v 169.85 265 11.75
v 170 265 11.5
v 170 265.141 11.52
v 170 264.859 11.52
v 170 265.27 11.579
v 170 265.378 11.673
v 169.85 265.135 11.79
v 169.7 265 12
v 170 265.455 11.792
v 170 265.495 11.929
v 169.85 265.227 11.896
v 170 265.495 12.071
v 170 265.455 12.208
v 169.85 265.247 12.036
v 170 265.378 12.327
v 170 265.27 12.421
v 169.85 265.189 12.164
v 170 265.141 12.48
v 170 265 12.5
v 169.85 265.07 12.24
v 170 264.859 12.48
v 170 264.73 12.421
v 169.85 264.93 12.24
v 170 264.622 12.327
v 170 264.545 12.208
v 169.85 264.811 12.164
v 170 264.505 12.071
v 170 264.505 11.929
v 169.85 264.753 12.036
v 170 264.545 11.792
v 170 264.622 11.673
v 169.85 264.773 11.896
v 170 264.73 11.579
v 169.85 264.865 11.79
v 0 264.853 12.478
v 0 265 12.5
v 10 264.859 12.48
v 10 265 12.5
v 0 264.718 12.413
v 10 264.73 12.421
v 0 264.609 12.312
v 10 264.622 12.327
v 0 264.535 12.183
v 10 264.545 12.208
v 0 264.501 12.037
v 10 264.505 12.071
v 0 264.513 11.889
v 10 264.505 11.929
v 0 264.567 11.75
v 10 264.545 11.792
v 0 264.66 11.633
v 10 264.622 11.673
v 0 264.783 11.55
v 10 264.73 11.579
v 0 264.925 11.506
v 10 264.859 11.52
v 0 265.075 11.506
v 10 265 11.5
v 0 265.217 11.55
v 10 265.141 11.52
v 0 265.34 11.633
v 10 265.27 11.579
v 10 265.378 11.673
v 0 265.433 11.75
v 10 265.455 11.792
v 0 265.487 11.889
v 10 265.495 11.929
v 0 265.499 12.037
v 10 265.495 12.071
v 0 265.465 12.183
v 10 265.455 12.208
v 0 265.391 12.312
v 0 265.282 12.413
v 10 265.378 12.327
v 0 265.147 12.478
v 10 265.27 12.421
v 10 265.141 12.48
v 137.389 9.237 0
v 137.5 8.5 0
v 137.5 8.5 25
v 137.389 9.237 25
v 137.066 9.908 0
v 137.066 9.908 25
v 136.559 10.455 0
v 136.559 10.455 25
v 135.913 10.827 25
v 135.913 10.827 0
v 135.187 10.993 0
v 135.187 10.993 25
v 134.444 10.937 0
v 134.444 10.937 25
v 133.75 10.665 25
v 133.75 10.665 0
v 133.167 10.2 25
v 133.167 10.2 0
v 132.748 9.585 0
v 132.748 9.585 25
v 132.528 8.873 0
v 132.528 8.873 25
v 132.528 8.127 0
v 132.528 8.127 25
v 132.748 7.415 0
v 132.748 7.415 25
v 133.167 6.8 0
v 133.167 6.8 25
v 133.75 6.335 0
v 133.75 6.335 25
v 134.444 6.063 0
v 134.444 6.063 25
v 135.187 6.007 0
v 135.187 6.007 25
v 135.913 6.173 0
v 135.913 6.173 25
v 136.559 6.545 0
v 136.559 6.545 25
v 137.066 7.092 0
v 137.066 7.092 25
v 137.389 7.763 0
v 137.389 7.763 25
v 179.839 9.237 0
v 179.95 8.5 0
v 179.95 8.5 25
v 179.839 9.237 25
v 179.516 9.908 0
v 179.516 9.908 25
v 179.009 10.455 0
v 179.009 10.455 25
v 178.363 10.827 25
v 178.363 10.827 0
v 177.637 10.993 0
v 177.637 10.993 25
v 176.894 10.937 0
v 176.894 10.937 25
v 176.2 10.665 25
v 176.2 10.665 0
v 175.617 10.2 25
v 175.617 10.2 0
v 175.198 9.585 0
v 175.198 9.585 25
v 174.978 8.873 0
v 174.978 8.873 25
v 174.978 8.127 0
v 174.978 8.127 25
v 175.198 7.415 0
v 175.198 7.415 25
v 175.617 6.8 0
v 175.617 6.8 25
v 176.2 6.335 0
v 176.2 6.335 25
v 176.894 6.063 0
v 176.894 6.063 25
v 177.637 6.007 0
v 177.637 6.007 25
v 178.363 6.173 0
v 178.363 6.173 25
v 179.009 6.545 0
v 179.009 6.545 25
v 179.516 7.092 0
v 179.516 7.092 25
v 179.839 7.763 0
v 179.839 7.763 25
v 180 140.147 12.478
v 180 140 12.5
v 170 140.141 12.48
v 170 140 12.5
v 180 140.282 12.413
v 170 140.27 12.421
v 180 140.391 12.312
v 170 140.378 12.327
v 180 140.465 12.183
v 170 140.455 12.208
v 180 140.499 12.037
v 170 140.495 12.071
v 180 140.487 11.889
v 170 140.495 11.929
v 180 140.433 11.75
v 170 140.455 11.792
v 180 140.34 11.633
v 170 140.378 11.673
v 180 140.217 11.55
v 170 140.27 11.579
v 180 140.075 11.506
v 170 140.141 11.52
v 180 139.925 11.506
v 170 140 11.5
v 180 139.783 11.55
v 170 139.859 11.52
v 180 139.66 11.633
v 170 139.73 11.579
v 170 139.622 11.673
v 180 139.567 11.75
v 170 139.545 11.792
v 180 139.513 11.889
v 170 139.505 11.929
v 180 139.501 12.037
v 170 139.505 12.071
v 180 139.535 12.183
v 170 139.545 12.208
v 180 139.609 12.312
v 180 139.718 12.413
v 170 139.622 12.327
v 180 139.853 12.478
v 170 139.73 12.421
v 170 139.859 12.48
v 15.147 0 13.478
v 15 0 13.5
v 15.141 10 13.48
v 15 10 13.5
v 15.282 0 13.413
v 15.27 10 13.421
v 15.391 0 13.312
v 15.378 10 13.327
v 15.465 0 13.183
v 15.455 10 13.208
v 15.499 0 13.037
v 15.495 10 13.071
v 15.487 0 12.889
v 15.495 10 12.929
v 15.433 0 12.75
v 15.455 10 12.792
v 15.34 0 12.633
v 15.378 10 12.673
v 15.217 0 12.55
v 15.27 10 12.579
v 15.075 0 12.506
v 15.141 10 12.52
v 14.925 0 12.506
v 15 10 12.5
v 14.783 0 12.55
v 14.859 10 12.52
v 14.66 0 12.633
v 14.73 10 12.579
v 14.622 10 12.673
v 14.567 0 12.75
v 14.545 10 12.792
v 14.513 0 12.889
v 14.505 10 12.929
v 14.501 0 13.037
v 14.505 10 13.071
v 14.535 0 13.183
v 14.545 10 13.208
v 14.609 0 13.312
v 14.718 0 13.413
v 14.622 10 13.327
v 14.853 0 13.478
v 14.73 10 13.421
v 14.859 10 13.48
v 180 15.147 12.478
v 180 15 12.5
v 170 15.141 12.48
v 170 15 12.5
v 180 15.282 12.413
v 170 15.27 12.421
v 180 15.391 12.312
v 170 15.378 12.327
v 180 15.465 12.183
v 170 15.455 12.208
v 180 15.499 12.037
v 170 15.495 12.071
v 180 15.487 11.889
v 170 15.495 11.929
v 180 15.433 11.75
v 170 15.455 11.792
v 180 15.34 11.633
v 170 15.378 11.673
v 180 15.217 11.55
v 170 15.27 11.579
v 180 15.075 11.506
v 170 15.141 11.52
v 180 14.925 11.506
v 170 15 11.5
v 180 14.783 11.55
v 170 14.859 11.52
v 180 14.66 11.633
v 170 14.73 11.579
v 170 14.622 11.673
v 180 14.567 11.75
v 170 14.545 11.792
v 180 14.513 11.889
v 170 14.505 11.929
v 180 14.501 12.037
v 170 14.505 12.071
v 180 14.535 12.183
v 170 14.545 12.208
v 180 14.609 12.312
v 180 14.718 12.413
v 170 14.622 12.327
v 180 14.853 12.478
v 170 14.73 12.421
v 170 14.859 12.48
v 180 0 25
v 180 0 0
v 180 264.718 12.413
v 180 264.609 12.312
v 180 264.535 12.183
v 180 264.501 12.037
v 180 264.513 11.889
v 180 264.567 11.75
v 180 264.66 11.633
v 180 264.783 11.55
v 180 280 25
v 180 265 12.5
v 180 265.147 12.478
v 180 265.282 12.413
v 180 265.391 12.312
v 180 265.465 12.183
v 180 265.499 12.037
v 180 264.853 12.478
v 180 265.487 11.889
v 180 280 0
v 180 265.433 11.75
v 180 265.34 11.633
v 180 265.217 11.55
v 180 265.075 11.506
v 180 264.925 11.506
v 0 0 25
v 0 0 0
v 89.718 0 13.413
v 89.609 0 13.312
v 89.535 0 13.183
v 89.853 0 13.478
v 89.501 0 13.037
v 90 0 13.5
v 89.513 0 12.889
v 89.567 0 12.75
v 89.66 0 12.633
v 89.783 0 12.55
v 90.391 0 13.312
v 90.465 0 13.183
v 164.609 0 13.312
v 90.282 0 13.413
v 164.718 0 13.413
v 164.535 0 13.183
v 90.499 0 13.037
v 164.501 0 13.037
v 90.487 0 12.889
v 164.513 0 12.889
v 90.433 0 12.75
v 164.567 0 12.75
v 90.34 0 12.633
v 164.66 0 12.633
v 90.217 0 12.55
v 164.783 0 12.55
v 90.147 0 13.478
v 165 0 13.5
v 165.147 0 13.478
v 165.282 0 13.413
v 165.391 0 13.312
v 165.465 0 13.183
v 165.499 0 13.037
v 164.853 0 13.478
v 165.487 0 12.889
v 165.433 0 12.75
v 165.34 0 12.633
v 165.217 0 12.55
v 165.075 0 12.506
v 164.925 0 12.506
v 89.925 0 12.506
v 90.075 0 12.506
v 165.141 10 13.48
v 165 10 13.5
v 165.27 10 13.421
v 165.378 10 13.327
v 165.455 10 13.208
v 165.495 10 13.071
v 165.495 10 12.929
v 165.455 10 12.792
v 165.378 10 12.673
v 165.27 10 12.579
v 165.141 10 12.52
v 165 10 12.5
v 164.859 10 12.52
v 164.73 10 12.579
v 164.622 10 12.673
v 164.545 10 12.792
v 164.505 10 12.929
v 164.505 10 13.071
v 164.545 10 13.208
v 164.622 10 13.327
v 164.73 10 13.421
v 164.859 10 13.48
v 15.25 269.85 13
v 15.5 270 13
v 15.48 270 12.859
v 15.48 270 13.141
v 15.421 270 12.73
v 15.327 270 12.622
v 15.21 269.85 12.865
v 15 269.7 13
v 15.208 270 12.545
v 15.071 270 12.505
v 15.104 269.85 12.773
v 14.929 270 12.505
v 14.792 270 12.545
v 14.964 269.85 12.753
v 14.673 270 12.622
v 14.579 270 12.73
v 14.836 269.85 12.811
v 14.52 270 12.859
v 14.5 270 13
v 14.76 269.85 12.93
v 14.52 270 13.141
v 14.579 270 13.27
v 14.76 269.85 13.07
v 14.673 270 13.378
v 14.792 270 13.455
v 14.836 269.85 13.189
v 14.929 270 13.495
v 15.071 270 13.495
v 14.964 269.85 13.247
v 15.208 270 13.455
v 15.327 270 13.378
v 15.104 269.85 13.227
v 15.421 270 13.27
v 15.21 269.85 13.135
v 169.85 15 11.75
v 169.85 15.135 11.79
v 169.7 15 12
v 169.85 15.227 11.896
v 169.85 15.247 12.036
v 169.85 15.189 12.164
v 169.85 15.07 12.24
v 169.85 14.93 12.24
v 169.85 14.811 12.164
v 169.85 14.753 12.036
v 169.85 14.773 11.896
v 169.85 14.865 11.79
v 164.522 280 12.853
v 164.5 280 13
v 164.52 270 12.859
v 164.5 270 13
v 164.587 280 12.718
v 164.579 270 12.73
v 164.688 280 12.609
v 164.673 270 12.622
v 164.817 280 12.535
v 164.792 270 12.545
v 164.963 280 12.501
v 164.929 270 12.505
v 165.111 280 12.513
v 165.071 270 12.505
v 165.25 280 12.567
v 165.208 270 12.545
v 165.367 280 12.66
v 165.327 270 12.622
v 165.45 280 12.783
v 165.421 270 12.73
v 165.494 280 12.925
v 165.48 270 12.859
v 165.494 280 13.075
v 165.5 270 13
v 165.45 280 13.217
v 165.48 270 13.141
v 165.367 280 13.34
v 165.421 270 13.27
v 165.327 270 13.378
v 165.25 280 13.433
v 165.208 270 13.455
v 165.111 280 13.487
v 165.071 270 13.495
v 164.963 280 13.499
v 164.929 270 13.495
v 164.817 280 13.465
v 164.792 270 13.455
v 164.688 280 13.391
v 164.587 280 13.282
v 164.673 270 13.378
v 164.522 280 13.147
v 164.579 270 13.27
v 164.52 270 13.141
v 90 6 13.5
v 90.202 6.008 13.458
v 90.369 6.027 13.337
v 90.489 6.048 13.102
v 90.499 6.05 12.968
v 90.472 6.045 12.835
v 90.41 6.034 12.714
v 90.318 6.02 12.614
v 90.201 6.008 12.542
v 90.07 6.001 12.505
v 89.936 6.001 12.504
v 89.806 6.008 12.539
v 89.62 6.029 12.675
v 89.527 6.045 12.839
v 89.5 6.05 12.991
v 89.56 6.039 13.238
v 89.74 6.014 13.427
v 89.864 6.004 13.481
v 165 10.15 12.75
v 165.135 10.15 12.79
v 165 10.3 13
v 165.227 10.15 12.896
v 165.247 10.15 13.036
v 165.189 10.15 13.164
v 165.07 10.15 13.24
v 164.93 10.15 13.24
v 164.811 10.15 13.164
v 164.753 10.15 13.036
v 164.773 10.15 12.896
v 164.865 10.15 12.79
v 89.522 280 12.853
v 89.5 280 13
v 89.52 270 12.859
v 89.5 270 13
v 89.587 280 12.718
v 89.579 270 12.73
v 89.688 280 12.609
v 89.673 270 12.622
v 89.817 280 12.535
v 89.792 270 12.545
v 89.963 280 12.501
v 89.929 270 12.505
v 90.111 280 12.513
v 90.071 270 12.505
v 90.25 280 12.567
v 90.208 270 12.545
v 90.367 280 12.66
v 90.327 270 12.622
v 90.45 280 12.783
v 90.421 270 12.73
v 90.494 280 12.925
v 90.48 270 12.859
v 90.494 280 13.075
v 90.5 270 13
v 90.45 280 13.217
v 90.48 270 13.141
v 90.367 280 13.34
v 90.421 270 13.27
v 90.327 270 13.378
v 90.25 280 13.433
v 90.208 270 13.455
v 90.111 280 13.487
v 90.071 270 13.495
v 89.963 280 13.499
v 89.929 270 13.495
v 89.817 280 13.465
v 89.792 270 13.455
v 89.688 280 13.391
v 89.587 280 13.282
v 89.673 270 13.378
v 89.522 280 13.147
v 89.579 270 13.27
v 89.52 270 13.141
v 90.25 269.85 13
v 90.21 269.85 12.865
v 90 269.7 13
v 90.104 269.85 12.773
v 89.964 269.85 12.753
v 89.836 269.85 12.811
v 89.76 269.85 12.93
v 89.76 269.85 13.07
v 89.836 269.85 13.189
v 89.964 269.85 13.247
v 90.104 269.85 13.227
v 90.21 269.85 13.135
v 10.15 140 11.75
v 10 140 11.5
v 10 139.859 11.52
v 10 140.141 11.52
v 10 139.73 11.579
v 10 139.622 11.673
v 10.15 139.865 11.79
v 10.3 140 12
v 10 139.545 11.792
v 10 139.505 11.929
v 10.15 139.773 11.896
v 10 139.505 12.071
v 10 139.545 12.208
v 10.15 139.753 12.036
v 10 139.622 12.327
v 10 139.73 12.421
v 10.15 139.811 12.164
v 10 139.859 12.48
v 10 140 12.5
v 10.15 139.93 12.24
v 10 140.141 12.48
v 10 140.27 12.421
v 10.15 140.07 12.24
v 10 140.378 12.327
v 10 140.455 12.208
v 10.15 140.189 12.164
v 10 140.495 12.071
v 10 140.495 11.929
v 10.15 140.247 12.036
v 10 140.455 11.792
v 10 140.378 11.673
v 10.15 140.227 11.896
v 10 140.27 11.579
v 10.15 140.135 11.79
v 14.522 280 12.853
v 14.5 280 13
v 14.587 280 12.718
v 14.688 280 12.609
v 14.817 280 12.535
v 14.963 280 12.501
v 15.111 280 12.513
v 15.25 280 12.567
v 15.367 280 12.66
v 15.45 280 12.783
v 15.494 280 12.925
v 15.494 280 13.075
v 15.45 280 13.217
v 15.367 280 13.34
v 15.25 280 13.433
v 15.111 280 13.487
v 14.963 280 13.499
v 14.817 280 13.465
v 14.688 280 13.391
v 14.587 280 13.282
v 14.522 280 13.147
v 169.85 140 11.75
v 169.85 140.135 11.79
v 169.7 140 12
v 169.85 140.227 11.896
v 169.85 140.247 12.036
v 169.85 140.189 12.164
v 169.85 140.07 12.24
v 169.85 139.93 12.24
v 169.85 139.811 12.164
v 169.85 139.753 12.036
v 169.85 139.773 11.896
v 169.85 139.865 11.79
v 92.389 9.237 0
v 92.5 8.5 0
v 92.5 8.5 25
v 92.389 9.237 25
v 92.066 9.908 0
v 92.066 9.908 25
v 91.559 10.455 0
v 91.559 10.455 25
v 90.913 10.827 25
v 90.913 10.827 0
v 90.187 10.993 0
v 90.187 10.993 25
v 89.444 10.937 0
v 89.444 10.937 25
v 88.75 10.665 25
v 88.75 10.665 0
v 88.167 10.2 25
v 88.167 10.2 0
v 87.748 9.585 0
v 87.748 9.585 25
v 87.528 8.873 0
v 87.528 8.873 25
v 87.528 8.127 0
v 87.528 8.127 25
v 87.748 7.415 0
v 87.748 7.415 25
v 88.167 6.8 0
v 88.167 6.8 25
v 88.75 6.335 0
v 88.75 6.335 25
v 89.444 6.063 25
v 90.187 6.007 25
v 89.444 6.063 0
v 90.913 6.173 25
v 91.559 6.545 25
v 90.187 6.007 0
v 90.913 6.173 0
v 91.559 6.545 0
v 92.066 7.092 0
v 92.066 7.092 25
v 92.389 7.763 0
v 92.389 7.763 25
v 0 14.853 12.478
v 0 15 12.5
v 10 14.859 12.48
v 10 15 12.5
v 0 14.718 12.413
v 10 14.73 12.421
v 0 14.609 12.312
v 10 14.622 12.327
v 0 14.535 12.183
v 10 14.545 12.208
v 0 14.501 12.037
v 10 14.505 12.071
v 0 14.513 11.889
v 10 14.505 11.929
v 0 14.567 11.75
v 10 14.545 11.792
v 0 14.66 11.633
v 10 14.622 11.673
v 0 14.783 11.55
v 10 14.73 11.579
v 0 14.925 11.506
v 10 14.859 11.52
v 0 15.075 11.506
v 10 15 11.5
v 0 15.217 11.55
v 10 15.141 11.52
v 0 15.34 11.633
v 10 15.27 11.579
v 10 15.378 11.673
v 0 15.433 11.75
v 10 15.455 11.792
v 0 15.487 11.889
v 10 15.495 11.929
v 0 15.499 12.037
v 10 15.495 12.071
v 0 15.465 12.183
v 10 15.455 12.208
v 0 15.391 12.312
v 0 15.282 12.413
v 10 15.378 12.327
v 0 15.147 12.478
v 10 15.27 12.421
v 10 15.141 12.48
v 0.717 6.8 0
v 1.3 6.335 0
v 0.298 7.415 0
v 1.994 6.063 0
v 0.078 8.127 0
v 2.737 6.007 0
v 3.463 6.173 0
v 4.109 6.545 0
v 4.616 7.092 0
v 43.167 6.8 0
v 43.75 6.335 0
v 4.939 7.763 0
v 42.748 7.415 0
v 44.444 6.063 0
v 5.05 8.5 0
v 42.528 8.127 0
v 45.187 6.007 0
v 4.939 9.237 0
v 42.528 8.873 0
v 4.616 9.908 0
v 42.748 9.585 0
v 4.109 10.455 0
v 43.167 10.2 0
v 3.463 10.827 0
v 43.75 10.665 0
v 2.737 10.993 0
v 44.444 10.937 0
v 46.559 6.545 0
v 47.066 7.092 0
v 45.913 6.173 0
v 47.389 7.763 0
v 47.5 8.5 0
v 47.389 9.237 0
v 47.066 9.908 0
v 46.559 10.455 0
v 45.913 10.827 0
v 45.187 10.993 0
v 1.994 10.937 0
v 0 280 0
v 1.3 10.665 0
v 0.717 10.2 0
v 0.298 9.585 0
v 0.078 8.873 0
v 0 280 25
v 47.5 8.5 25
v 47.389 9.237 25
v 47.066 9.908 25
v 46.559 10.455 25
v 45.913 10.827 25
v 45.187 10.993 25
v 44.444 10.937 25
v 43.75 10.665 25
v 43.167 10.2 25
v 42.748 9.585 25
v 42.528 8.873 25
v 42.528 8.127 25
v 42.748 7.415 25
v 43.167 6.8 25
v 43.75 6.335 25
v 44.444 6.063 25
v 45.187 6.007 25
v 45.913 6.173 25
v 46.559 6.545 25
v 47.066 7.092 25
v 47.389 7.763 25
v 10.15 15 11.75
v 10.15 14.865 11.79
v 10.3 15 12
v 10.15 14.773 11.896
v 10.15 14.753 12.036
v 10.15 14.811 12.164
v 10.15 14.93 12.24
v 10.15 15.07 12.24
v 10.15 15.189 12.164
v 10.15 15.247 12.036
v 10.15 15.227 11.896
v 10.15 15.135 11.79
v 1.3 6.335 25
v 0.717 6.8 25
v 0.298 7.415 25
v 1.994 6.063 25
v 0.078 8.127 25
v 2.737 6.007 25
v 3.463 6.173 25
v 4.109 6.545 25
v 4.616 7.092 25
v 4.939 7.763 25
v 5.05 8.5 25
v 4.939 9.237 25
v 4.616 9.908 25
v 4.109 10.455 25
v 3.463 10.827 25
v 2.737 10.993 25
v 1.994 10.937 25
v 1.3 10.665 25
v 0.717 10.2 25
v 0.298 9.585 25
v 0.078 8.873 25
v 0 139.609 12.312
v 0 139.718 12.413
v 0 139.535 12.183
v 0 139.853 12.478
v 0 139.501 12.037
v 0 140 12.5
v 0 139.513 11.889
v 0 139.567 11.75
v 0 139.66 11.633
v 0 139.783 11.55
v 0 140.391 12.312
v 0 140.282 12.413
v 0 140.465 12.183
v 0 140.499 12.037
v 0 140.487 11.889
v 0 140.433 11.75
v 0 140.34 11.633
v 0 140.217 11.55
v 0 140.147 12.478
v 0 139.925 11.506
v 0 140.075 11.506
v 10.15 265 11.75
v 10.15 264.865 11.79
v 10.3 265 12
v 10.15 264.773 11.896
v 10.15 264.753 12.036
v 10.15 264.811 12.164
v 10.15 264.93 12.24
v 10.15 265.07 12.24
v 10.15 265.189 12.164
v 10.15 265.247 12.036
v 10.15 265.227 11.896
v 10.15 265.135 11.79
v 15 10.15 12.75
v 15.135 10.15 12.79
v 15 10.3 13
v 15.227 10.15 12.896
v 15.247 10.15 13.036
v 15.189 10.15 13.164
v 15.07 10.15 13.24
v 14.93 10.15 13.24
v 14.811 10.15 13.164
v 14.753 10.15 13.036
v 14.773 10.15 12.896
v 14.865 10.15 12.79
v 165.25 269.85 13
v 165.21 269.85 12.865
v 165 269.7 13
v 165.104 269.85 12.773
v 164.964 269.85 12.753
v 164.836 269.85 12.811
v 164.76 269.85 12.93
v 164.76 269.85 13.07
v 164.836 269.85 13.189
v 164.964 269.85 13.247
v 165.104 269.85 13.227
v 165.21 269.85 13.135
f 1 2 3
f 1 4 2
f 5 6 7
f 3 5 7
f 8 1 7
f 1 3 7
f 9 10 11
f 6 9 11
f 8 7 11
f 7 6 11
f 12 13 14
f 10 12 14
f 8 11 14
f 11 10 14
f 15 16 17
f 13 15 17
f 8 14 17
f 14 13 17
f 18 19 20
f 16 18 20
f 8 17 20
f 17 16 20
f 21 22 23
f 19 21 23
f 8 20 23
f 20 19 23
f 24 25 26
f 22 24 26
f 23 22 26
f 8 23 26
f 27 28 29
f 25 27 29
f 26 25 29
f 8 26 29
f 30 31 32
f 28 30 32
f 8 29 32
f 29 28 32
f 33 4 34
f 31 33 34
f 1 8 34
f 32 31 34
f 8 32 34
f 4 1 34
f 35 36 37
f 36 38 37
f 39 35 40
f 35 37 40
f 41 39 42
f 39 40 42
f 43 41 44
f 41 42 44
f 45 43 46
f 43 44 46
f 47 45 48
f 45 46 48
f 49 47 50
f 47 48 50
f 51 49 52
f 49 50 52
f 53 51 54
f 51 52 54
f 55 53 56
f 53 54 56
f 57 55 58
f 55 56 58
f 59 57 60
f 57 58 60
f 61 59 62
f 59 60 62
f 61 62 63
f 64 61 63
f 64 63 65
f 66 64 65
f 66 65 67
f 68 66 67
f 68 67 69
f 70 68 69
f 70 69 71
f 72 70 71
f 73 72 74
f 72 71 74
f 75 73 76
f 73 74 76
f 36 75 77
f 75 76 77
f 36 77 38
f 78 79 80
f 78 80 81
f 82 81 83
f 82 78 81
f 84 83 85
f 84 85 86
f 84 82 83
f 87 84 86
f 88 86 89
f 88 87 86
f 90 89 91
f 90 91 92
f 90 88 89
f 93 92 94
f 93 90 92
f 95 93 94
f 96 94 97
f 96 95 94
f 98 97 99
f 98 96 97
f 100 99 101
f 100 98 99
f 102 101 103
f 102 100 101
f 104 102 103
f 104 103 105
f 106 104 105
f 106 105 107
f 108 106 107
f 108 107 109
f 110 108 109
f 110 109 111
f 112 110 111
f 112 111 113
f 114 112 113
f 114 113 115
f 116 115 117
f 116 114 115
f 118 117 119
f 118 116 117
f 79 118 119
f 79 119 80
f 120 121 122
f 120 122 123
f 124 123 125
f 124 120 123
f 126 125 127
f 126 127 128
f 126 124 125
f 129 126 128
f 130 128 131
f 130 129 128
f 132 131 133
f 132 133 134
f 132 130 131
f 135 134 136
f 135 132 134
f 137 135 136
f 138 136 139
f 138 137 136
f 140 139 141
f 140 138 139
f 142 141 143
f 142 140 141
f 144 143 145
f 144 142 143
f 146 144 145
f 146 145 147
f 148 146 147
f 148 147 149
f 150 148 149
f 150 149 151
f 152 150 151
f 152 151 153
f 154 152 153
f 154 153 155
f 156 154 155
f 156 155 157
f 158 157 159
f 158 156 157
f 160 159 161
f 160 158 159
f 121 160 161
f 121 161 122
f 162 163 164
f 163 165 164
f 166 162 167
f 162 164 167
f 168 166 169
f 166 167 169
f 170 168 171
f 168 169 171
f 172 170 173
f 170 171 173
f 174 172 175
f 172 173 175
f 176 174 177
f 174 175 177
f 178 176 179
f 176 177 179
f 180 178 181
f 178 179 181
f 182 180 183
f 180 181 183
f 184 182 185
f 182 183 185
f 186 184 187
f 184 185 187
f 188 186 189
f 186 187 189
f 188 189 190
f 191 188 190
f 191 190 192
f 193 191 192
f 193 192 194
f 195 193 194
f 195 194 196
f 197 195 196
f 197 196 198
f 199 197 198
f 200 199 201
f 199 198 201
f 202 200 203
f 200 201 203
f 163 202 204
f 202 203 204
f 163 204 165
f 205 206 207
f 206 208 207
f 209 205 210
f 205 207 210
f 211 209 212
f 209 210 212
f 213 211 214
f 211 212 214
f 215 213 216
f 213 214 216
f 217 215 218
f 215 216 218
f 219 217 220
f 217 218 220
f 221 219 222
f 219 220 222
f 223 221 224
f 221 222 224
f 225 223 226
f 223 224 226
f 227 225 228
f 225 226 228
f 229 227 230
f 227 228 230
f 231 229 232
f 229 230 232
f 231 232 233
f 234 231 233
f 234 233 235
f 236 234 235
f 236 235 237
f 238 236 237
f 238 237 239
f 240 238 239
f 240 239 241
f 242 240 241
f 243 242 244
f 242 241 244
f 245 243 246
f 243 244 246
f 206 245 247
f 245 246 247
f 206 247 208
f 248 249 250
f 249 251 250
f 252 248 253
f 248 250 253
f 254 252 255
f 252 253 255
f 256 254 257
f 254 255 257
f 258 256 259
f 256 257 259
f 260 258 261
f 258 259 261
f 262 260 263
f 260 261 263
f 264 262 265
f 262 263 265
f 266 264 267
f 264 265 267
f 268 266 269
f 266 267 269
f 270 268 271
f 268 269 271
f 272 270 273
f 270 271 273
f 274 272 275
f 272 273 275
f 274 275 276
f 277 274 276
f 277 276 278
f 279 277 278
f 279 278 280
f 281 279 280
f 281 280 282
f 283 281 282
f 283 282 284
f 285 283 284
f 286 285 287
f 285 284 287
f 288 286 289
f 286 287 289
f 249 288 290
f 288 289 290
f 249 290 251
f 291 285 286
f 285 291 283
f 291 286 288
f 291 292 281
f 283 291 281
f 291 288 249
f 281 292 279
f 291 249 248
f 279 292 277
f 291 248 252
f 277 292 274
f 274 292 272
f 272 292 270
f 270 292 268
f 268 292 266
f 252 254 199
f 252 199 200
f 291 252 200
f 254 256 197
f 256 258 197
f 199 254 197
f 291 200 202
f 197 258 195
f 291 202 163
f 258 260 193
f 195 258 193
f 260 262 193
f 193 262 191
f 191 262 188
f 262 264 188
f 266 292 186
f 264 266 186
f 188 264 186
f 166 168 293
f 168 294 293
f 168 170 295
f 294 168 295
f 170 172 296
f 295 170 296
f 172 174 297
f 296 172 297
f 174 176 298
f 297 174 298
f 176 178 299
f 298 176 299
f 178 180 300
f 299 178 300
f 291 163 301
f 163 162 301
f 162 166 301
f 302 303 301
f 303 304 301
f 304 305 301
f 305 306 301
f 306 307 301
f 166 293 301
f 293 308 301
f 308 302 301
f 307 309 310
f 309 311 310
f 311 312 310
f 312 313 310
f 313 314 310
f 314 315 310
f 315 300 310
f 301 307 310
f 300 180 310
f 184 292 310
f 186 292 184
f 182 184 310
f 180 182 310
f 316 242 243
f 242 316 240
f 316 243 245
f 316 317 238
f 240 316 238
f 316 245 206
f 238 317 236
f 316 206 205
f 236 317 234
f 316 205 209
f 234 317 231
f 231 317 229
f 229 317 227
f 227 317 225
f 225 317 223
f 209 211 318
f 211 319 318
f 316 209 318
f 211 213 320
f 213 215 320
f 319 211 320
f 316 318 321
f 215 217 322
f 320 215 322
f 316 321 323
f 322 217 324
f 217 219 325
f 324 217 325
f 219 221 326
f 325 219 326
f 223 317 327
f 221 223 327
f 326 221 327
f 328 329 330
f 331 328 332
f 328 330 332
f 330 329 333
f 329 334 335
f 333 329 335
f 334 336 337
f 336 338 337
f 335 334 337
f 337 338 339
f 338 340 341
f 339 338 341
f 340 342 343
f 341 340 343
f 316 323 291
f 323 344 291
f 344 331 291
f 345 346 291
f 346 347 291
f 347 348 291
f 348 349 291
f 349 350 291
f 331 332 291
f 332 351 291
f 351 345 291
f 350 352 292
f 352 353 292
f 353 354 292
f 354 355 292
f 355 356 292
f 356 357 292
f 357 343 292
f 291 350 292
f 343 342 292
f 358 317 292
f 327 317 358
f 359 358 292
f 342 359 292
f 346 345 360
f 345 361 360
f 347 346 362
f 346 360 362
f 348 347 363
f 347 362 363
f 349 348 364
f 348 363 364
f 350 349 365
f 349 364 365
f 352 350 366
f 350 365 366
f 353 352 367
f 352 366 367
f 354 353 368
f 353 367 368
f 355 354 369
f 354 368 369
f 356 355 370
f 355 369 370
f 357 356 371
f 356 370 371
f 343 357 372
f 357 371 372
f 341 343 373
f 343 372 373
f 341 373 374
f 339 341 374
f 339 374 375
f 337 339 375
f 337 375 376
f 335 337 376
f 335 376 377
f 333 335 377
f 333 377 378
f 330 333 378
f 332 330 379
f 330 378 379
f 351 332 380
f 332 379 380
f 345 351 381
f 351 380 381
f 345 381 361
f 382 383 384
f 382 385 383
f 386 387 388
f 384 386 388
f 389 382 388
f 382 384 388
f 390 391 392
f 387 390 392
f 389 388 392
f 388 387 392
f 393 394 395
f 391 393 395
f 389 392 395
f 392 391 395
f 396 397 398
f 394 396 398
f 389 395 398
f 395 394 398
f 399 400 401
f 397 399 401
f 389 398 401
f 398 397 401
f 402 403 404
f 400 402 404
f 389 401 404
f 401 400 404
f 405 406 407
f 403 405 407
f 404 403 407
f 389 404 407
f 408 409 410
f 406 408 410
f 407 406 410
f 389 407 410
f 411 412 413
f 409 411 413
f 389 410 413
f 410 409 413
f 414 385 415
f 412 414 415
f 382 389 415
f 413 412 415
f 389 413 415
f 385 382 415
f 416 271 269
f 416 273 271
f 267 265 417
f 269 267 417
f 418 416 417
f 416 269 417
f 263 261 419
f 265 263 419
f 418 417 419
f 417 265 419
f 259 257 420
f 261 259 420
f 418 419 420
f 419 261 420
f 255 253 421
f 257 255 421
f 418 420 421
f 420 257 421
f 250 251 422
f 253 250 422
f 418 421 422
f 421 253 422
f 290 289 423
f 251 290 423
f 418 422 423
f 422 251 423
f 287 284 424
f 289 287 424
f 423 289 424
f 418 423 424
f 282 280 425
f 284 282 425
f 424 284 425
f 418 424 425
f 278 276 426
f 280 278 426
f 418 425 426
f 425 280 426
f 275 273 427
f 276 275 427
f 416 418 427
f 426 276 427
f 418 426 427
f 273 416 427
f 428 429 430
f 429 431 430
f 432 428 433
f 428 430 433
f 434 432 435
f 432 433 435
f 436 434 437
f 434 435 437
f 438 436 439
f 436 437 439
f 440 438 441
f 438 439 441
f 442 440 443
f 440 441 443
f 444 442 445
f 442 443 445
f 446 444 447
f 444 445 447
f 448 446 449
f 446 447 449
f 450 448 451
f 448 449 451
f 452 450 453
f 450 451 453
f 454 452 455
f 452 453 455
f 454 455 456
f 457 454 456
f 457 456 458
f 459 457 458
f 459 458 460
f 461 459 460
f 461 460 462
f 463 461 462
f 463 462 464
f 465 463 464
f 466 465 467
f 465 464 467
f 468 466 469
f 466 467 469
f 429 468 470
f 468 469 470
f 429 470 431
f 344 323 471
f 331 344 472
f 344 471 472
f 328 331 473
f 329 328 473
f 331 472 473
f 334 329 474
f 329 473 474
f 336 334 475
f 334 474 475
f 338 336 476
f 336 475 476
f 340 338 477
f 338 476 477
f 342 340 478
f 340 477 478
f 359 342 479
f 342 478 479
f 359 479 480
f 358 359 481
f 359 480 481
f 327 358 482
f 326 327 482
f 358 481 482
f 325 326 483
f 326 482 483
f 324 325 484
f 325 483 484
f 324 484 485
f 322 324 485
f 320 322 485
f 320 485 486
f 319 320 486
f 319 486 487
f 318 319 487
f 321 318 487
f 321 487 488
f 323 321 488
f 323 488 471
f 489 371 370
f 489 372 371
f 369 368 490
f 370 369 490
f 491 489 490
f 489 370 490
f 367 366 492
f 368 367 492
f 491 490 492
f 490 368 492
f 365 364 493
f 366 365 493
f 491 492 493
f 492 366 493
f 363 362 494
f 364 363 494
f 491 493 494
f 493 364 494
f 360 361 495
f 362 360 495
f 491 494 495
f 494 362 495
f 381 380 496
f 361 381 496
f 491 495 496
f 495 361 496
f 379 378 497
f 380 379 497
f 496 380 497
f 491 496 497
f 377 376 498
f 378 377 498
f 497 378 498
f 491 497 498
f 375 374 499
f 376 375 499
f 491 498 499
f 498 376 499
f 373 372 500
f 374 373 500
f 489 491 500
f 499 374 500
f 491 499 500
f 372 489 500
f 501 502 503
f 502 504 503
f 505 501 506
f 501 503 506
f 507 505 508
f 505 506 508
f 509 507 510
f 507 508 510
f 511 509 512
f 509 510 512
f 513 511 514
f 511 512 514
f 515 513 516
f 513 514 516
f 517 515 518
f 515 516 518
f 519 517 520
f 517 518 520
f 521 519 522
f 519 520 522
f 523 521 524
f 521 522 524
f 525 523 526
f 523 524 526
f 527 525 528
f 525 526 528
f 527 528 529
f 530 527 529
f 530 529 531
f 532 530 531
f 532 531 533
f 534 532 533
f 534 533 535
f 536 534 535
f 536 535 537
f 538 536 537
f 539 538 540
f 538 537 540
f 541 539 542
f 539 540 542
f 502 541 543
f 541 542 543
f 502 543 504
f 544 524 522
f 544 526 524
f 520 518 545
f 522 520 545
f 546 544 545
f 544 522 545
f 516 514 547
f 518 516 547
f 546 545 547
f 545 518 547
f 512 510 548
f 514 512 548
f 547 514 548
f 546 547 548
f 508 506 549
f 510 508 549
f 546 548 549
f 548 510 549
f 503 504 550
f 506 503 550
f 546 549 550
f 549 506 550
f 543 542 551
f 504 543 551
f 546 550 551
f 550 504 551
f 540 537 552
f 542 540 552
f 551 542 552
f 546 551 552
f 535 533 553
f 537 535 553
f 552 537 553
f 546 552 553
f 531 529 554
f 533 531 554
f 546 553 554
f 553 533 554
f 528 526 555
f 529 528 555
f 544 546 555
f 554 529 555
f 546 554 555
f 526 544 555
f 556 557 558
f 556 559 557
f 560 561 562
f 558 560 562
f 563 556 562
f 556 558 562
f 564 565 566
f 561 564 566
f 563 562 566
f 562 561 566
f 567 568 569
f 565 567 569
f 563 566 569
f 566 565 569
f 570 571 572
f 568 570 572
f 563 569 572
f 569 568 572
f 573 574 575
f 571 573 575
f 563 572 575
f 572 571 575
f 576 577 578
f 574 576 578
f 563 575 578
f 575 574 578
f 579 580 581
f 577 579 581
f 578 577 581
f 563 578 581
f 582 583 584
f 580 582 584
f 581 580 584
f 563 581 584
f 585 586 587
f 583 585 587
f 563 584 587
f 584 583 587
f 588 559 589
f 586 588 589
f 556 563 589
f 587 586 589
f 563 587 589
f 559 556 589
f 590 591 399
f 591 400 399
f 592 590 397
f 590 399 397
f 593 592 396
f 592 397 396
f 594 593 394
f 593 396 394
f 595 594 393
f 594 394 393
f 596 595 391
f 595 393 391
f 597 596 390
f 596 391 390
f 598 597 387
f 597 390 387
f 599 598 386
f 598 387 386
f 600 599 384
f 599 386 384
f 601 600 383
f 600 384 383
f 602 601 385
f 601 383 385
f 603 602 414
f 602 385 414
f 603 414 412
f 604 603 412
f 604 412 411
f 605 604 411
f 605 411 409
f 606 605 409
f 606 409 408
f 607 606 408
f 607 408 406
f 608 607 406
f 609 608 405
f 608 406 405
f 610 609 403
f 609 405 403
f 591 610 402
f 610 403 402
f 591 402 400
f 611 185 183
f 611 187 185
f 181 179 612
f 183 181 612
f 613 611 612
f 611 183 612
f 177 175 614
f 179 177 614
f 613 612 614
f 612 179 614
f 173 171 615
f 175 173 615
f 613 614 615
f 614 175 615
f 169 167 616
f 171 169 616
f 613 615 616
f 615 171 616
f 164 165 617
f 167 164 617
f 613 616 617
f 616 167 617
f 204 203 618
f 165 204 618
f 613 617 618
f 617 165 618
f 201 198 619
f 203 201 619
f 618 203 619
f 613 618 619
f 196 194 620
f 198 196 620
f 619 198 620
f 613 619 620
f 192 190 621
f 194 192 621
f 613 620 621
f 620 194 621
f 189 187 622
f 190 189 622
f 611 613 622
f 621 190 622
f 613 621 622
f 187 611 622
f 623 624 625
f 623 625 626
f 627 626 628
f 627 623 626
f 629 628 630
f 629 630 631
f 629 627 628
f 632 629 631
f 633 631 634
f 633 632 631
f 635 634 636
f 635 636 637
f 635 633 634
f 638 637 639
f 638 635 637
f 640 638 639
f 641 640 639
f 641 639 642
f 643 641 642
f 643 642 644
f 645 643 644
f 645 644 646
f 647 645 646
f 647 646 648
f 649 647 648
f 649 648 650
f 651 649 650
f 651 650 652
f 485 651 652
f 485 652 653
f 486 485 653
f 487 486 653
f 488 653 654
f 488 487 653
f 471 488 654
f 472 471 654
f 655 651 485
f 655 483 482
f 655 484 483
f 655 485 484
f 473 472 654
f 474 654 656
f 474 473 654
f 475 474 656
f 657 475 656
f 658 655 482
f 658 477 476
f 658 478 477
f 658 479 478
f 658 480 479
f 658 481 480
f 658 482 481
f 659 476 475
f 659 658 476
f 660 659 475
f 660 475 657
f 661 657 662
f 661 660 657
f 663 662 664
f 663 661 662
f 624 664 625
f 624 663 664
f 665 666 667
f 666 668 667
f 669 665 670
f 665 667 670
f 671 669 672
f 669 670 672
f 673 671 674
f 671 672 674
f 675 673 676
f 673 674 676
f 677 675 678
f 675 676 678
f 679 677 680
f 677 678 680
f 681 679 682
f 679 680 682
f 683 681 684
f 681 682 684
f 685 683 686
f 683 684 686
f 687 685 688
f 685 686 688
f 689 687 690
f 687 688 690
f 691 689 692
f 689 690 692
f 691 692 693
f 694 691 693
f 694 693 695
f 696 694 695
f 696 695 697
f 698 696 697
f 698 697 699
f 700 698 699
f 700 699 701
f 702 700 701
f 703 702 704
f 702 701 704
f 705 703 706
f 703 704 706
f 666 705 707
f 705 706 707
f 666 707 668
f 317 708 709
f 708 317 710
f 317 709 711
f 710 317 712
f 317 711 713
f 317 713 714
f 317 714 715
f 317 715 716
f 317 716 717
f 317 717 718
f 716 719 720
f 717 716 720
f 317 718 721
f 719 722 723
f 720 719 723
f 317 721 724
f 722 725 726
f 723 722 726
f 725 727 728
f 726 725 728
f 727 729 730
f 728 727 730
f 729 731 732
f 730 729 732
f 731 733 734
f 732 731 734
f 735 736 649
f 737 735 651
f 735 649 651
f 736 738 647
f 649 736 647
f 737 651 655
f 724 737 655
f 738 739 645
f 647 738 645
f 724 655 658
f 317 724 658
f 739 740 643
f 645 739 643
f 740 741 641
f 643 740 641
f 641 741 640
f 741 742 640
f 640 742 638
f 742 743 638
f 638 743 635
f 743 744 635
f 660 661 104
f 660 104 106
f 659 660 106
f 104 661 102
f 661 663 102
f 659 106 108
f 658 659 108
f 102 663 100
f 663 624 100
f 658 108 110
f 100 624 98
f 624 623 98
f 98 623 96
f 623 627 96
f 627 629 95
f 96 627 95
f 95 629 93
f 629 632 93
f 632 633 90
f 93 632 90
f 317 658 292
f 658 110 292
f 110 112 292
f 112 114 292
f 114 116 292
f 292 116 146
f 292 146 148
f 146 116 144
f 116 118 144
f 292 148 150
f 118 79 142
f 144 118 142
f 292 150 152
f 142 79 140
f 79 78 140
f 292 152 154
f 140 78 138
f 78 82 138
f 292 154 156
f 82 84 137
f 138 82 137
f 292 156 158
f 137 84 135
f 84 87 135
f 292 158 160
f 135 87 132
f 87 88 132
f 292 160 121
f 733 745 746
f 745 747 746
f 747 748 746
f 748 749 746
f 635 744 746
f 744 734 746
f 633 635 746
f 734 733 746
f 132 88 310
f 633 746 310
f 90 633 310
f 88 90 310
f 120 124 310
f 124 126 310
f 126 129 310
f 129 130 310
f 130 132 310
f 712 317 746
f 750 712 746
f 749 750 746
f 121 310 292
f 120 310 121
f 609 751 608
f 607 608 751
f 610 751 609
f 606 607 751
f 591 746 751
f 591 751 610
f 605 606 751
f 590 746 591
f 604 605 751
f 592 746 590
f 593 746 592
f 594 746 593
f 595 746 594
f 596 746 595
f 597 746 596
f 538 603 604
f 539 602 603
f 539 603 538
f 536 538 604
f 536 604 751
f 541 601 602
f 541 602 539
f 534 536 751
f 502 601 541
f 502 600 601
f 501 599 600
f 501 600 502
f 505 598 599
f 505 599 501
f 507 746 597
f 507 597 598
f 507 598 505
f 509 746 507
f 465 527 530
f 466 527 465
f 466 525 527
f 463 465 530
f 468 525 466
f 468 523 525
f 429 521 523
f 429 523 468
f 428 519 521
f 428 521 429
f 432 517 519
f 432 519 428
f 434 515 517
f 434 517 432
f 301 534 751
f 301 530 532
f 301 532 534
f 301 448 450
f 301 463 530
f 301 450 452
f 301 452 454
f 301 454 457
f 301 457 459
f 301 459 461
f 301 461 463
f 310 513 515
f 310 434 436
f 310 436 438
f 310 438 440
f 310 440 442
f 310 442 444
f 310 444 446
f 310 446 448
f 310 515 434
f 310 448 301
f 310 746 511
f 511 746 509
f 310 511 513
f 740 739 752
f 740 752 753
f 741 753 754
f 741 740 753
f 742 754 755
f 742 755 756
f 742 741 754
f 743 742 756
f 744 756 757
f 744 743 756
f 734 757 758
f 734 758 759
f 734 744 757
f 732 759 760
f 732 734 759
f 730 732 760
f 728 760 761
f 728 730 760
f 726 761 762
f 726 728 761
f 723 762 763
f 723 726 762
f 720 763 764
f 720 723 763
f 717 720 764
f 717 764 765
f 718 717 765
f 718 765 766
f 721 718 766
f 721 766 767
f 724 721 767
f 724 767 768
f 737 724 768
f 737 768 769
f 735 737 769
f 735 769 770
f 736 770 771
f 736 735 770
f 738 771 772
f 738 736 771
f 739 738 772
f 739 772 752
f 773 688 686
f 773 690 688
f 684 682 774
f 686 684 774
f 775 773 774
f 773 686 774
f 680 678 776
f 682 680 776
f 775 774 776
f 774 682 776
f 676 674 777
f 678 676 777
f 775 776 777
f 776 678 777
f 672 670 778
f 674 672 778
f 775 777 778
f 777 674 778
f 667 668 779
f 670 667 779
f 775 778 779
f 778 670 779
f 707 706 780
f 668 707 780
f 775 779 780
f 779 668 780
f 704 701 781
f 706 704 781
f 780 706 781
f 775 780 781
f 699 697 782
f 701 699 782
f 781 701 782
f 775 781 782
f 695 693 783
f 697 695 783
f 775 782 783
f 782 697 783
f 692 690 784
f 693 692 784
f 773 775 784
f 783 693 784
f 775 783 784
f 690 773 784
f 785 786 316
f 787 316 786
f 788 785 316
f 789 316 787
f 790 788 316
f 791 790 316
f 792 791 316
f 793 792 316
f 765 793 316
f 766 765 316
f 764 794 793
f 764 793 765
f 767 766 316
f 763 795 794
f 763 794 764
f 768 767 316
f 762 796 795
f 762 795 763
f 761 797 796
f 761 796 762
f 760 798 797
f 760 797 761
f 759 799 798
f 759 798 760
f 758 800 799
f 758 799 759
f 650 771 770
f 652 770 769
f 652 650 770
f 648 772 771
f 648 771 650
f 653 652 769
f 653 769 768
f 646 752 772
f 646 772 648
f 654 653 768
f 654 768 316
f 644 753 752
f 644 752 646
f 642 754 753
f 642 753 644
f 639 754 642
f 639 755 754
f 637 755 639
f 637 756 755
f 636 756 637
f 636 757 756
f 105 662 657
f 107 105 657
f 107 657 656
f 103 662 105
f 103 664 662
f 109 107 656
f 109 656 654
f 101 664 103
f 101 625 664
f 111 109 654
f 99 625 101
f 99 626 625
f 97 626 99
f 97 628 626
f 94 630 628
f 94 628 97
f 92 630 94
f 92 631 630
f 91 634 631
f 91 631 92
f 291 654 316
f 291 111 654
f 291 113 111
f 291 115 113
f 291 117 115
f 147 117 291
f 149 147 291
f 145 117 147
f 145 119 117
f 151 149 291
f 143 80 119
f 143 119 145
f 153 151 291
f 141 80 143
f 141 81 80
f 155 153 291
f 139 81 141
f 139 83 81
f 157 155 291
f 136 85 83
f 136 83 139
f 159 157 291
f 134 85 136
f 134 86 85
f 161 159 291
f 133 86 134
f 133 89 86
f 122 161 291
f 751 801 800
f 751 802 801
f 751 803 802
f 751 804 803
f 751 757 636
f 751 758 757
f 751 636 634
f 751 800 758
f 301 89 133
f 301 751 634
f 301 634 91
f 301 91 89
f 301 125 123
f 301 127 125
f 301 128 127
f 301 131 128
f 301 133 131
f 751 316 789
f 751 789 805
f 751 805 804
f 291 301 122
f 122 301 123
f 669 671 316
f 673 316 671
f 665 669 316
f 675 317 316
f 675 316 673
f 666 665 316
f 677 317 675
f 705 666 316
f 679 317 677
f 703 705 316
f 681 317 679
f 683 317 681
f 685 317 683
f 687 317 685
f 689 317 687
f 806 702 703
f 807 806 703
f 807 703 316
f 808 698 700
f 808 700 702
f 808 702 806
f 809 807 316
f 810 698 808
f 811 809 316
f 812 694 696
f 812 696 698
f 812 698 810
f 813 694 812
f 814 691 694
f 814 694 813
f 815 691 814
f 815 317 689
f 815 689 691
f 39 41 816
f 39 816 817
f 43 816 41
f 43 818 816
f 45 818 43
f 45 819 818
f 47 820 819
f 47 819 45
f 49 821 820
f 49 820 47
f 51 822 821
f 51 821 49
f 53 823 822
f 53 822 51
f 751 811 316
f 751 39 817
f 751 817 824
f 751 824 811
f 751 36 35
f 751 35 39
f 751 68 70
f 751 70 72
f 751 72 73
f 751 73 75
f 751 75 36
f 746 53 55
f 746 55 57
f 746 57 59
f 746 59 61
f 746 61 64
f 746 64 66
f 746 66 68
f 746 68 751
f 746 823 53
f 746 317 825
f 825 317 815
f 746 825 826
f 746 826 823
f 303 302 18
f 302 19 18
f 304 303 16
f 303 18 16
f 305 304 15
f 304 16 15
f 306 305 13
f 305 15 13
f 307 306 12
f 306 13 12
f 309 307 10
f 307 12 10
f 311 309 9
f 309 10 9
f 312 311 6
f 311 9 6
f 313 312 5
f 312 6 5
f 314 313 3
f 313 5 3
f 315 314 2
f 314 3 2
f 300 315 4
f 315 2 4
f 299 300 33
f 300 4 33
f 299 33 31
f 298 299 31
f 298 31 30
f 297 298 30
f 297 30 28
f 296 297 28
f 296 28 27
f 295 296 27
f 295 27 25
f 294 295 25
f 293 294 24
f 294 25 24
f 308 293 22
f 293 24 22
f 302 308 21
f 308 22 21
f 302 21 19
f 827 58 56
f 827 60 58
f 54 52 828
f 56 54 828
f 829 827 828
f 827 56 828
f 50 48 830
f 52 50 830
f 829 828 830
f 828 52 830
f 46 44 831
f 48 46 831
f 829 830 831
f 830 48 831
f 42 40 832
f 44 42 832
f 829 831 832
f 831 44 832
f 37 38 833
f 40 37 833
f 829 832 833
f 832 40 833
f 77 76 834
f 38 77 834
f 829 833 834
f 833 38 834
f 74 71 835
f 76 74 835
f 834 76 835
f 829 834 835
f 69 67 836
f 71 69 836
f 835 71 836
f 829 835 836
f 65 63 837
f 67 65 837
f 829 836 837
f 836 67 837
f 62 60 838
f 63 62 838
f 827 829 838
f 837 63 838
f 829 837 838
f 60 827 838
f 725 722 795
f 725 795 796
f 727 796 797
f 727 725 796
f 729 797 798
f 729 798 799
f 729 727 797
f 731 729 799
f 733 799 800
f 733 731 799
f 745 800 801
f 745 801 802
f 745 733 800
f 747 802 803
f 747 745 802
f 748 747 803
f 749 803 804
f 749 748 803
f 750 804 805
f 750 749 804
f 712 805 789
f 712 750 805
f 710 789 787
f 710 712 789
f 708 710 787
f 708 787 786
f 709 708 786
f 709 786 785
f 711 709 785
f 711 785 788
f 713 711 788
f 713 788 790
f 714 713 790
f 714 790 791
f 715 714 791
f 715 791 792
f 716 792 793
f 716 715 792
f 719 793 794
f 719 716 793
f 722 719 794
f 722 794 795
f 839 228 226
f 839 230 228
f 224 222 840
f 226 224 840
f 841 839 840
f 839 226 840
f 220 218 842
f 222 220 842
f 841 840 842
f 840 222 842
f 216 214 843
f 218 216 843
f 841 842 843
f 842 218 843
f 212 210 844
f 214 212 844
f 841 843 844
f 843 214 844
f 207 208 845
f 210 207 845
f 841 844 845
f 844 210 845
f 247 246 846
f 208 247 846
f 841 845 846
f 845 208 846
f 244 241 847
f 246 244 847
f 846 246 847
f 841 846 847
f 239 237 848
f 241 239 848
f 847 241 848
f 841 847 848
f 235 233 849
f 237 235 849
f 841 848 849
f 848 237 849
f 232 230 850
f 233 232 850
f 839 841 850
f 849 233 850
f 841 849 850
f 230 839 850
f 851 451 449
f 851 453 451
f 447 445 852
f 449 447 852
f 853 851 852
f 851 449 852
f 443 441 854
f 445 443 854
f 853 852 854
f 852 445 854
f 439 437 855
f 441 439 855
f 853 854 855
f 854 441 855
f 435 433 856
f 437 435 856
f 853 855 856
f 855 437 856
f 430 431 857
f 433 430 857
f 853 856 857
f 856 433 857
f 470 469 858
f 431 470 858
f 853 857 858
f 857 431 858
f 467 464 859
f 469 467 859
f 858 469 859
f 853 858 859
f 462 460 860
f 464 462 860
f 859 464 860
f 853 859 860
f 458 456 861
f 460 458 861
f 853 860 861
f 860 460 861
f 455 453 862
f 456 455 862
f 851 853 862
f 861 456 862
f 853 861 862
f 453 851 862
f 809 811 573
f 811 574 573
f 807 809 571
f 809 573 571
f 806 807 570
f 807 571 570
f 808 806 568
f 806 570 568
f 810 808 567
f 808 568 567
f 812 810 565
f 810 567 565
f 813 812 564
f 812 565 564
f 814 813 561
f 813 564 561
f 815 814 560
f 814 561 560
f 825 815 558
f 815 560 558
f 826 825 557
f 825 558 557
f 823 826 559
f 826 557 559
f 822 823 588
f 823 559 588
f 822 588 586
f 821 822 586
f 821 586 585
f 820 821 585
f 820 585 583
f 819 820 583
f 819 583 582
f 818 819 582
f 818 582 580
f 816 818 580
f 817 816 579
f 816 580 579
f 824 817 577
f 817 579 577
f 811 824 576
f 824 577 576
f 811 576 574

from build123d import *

# Parameters (mm, degrees)
ESBO_O1_W                      = 180
ESBO_O1_H                      = 280
ESBO_O1_R                      = 2.5
RESSALTO_EXTRUS_O3_DEPTH       = 25
FURO_DE_DI_METRO_1_0_1_1_D     = 1
FURO_DE_DI_METRO_1_0_1_1_DEPTH = 10
FURO_DE_DI_METRO_1_0_1_1_TIP   = 0.30043031
FURO_DE_DI_METRO_1_0_1_2_D     = 1
FURO_DE_DI_METRO_1_0_1_2_DEPTH = 10
FURO_DE_DI_METRO_1_0_1_2_TIP   = 0.30043031
FURO_DE_DI_METRO_1_0_1_3_D     = 1
FURO_DE_DI_METRO_1_0_1_3_DEPTH = 10
FURO_DE_DI_METRO_1_0_1_3_TIP   = 0.30043031
FURO_DE_DI_METRO_1_0_1_4_D     = 1
FURO_DE_DI_METRO_1_0_1_4_DEPTH = 10
FURO_DE_DI_METRO_1_0_1_4_TIP   = 0.30043031


with BuildPart() as part:
    # Esboço1 → Ressalto-extrusão3 (new body)
    with BuildSketch(Plane.XY):
        with Locations((90, 140)):
            Rectangle(ESBO_O1_W, ESBO_O1_H)
        with Locations((2.55, 8.5)):
            Circle(ESBO_O1_R, mode=Mode.SUBTRACT)
        with Locations((45, 8.5)):
            Circle(ESBO_O1_R, mode=Mode.SUBTRACT)
        with Locations((90, 8.5)):
            Circle(ESBO_O1_R, mode=Mode.SUBTRACT)
        with Locations((135, 8.5)):
            Circle(ESBO_O1_R, mode=Mode.SUBTRACT)
        with Locations((177.45, 8.5)):
            Circle(ESBO_O1_R, mode=Mode.SUBTRACT)
    extrude(amount=RESSALTO_EXTRUS_O3_DEPTH)

    # Furo de diâmetro Ø1.0 (1)1
    with Locations(Plane(origin=(0, 265, 12), x_dir=(0, 0, -1), z_dir=(-1, 0, 0))):
        with Locations((0, 0), (0, 125), (0, 250)):
            Hole(FURO_DE_DI_METRO_1_0_1_1_D / 2, depth=FURO_DE_DI_METRO_1_0_1_1_DEPTH)
            with Locations((0, 0, -(FURO_DE_DI_METRO_1_0_1_1_DEPTH + FURO_DE_DI_METRO_1_0_1_1_TIP / 2))):  # 118° drill point
                Cone(0, FURO_DE_DI_METRO_1_0_1_1_D / 2, FURO_DE_DI_METRO_1_0_1_1_TIP, mode=Mode.SUBTRACT)

    # Furo de diâmetro Ø1.0 (1)2
    with Locations(Plane(origin=(180, 0, 0), x_dir=(0, 0, -1), z_dir=(1, 0, 0))):
        with Locations((-12, 15), (-12, 140), (-12, 265)):
            Hole(FURO_DE_DI_METRO_1_0_1_2_D / 2, depth=FURO_DE_DI_METRO_1_0_1_2_DEPTH)
            with Locations((0, 0, -(FURO_DE_DI_METRO_1_0_1_2_DEPTH + FURO_DE_DI_METRO_1_0_1_2_TIP / 2))):  # 118° drill point
                Cone(0, FURO_DE_DI_METRO_1_0_1_2_D / 2, FURO_DE_DI_METRO_1_0_1_2_TIP, mode=Mode.SUBTRACT)

    # Furo de diâmetro Ø1.0 (1)3
    with Locations(Plane(origin=(15, 0, 13), x_dir=(0, 0, -1), z_dir=(0, -1, 0))):
        with Locations((0, 0), (0, 75), (0, 150)):
            Hole(FURO_DE_DI_METRO_1_0_1_3_D / 2, depth=FURO_DE_DI_METRO_1_0_1_3_DEPTH)
            with Locations((0, 0, -(FURO_DE_DI_METRO_1_0_1_3_DEPTH + FURO_DE_DI_METRO_1_0_1_3_TIP / 2))):  # 118° drill point
                Cone(0, FURO_DE_DI_METRO_1_0_1_3_D / 2, FURO_DE_DI_METRO_1_0_1_3_TIP, mode=Mode.SUBTRACT)

    # Furo de diâmetro Ø1.0 (1)4
    with Locations(Plane(origin=(0, 280, 0), x_dir=(1, 0, 0), z_dir=(0, 1, 0))):
        with Locations((15, -13), (90, -13), (165, -13)):
            Hole(FURO_DE_DI_METRO_1_0_1_4_D / 2, depth=FURO_DE_DI_METRO_1_0_1_4_DEPTH)
            with Locations((0, 0, -(FURO_DE_DI_METRO_1_0_1_4_DEPTH + FURO_DE_DI_METRO_1_0_1_4_TIP / 2))):  # 118° drill point
                Cone(0, FURO_DE_DI_METRO_1_0_1_4_D / 2, FURO_DE_DI_METRO_1_0_1_4_TIP, mode=Mode.SUBTRACT)


solid = part.part
